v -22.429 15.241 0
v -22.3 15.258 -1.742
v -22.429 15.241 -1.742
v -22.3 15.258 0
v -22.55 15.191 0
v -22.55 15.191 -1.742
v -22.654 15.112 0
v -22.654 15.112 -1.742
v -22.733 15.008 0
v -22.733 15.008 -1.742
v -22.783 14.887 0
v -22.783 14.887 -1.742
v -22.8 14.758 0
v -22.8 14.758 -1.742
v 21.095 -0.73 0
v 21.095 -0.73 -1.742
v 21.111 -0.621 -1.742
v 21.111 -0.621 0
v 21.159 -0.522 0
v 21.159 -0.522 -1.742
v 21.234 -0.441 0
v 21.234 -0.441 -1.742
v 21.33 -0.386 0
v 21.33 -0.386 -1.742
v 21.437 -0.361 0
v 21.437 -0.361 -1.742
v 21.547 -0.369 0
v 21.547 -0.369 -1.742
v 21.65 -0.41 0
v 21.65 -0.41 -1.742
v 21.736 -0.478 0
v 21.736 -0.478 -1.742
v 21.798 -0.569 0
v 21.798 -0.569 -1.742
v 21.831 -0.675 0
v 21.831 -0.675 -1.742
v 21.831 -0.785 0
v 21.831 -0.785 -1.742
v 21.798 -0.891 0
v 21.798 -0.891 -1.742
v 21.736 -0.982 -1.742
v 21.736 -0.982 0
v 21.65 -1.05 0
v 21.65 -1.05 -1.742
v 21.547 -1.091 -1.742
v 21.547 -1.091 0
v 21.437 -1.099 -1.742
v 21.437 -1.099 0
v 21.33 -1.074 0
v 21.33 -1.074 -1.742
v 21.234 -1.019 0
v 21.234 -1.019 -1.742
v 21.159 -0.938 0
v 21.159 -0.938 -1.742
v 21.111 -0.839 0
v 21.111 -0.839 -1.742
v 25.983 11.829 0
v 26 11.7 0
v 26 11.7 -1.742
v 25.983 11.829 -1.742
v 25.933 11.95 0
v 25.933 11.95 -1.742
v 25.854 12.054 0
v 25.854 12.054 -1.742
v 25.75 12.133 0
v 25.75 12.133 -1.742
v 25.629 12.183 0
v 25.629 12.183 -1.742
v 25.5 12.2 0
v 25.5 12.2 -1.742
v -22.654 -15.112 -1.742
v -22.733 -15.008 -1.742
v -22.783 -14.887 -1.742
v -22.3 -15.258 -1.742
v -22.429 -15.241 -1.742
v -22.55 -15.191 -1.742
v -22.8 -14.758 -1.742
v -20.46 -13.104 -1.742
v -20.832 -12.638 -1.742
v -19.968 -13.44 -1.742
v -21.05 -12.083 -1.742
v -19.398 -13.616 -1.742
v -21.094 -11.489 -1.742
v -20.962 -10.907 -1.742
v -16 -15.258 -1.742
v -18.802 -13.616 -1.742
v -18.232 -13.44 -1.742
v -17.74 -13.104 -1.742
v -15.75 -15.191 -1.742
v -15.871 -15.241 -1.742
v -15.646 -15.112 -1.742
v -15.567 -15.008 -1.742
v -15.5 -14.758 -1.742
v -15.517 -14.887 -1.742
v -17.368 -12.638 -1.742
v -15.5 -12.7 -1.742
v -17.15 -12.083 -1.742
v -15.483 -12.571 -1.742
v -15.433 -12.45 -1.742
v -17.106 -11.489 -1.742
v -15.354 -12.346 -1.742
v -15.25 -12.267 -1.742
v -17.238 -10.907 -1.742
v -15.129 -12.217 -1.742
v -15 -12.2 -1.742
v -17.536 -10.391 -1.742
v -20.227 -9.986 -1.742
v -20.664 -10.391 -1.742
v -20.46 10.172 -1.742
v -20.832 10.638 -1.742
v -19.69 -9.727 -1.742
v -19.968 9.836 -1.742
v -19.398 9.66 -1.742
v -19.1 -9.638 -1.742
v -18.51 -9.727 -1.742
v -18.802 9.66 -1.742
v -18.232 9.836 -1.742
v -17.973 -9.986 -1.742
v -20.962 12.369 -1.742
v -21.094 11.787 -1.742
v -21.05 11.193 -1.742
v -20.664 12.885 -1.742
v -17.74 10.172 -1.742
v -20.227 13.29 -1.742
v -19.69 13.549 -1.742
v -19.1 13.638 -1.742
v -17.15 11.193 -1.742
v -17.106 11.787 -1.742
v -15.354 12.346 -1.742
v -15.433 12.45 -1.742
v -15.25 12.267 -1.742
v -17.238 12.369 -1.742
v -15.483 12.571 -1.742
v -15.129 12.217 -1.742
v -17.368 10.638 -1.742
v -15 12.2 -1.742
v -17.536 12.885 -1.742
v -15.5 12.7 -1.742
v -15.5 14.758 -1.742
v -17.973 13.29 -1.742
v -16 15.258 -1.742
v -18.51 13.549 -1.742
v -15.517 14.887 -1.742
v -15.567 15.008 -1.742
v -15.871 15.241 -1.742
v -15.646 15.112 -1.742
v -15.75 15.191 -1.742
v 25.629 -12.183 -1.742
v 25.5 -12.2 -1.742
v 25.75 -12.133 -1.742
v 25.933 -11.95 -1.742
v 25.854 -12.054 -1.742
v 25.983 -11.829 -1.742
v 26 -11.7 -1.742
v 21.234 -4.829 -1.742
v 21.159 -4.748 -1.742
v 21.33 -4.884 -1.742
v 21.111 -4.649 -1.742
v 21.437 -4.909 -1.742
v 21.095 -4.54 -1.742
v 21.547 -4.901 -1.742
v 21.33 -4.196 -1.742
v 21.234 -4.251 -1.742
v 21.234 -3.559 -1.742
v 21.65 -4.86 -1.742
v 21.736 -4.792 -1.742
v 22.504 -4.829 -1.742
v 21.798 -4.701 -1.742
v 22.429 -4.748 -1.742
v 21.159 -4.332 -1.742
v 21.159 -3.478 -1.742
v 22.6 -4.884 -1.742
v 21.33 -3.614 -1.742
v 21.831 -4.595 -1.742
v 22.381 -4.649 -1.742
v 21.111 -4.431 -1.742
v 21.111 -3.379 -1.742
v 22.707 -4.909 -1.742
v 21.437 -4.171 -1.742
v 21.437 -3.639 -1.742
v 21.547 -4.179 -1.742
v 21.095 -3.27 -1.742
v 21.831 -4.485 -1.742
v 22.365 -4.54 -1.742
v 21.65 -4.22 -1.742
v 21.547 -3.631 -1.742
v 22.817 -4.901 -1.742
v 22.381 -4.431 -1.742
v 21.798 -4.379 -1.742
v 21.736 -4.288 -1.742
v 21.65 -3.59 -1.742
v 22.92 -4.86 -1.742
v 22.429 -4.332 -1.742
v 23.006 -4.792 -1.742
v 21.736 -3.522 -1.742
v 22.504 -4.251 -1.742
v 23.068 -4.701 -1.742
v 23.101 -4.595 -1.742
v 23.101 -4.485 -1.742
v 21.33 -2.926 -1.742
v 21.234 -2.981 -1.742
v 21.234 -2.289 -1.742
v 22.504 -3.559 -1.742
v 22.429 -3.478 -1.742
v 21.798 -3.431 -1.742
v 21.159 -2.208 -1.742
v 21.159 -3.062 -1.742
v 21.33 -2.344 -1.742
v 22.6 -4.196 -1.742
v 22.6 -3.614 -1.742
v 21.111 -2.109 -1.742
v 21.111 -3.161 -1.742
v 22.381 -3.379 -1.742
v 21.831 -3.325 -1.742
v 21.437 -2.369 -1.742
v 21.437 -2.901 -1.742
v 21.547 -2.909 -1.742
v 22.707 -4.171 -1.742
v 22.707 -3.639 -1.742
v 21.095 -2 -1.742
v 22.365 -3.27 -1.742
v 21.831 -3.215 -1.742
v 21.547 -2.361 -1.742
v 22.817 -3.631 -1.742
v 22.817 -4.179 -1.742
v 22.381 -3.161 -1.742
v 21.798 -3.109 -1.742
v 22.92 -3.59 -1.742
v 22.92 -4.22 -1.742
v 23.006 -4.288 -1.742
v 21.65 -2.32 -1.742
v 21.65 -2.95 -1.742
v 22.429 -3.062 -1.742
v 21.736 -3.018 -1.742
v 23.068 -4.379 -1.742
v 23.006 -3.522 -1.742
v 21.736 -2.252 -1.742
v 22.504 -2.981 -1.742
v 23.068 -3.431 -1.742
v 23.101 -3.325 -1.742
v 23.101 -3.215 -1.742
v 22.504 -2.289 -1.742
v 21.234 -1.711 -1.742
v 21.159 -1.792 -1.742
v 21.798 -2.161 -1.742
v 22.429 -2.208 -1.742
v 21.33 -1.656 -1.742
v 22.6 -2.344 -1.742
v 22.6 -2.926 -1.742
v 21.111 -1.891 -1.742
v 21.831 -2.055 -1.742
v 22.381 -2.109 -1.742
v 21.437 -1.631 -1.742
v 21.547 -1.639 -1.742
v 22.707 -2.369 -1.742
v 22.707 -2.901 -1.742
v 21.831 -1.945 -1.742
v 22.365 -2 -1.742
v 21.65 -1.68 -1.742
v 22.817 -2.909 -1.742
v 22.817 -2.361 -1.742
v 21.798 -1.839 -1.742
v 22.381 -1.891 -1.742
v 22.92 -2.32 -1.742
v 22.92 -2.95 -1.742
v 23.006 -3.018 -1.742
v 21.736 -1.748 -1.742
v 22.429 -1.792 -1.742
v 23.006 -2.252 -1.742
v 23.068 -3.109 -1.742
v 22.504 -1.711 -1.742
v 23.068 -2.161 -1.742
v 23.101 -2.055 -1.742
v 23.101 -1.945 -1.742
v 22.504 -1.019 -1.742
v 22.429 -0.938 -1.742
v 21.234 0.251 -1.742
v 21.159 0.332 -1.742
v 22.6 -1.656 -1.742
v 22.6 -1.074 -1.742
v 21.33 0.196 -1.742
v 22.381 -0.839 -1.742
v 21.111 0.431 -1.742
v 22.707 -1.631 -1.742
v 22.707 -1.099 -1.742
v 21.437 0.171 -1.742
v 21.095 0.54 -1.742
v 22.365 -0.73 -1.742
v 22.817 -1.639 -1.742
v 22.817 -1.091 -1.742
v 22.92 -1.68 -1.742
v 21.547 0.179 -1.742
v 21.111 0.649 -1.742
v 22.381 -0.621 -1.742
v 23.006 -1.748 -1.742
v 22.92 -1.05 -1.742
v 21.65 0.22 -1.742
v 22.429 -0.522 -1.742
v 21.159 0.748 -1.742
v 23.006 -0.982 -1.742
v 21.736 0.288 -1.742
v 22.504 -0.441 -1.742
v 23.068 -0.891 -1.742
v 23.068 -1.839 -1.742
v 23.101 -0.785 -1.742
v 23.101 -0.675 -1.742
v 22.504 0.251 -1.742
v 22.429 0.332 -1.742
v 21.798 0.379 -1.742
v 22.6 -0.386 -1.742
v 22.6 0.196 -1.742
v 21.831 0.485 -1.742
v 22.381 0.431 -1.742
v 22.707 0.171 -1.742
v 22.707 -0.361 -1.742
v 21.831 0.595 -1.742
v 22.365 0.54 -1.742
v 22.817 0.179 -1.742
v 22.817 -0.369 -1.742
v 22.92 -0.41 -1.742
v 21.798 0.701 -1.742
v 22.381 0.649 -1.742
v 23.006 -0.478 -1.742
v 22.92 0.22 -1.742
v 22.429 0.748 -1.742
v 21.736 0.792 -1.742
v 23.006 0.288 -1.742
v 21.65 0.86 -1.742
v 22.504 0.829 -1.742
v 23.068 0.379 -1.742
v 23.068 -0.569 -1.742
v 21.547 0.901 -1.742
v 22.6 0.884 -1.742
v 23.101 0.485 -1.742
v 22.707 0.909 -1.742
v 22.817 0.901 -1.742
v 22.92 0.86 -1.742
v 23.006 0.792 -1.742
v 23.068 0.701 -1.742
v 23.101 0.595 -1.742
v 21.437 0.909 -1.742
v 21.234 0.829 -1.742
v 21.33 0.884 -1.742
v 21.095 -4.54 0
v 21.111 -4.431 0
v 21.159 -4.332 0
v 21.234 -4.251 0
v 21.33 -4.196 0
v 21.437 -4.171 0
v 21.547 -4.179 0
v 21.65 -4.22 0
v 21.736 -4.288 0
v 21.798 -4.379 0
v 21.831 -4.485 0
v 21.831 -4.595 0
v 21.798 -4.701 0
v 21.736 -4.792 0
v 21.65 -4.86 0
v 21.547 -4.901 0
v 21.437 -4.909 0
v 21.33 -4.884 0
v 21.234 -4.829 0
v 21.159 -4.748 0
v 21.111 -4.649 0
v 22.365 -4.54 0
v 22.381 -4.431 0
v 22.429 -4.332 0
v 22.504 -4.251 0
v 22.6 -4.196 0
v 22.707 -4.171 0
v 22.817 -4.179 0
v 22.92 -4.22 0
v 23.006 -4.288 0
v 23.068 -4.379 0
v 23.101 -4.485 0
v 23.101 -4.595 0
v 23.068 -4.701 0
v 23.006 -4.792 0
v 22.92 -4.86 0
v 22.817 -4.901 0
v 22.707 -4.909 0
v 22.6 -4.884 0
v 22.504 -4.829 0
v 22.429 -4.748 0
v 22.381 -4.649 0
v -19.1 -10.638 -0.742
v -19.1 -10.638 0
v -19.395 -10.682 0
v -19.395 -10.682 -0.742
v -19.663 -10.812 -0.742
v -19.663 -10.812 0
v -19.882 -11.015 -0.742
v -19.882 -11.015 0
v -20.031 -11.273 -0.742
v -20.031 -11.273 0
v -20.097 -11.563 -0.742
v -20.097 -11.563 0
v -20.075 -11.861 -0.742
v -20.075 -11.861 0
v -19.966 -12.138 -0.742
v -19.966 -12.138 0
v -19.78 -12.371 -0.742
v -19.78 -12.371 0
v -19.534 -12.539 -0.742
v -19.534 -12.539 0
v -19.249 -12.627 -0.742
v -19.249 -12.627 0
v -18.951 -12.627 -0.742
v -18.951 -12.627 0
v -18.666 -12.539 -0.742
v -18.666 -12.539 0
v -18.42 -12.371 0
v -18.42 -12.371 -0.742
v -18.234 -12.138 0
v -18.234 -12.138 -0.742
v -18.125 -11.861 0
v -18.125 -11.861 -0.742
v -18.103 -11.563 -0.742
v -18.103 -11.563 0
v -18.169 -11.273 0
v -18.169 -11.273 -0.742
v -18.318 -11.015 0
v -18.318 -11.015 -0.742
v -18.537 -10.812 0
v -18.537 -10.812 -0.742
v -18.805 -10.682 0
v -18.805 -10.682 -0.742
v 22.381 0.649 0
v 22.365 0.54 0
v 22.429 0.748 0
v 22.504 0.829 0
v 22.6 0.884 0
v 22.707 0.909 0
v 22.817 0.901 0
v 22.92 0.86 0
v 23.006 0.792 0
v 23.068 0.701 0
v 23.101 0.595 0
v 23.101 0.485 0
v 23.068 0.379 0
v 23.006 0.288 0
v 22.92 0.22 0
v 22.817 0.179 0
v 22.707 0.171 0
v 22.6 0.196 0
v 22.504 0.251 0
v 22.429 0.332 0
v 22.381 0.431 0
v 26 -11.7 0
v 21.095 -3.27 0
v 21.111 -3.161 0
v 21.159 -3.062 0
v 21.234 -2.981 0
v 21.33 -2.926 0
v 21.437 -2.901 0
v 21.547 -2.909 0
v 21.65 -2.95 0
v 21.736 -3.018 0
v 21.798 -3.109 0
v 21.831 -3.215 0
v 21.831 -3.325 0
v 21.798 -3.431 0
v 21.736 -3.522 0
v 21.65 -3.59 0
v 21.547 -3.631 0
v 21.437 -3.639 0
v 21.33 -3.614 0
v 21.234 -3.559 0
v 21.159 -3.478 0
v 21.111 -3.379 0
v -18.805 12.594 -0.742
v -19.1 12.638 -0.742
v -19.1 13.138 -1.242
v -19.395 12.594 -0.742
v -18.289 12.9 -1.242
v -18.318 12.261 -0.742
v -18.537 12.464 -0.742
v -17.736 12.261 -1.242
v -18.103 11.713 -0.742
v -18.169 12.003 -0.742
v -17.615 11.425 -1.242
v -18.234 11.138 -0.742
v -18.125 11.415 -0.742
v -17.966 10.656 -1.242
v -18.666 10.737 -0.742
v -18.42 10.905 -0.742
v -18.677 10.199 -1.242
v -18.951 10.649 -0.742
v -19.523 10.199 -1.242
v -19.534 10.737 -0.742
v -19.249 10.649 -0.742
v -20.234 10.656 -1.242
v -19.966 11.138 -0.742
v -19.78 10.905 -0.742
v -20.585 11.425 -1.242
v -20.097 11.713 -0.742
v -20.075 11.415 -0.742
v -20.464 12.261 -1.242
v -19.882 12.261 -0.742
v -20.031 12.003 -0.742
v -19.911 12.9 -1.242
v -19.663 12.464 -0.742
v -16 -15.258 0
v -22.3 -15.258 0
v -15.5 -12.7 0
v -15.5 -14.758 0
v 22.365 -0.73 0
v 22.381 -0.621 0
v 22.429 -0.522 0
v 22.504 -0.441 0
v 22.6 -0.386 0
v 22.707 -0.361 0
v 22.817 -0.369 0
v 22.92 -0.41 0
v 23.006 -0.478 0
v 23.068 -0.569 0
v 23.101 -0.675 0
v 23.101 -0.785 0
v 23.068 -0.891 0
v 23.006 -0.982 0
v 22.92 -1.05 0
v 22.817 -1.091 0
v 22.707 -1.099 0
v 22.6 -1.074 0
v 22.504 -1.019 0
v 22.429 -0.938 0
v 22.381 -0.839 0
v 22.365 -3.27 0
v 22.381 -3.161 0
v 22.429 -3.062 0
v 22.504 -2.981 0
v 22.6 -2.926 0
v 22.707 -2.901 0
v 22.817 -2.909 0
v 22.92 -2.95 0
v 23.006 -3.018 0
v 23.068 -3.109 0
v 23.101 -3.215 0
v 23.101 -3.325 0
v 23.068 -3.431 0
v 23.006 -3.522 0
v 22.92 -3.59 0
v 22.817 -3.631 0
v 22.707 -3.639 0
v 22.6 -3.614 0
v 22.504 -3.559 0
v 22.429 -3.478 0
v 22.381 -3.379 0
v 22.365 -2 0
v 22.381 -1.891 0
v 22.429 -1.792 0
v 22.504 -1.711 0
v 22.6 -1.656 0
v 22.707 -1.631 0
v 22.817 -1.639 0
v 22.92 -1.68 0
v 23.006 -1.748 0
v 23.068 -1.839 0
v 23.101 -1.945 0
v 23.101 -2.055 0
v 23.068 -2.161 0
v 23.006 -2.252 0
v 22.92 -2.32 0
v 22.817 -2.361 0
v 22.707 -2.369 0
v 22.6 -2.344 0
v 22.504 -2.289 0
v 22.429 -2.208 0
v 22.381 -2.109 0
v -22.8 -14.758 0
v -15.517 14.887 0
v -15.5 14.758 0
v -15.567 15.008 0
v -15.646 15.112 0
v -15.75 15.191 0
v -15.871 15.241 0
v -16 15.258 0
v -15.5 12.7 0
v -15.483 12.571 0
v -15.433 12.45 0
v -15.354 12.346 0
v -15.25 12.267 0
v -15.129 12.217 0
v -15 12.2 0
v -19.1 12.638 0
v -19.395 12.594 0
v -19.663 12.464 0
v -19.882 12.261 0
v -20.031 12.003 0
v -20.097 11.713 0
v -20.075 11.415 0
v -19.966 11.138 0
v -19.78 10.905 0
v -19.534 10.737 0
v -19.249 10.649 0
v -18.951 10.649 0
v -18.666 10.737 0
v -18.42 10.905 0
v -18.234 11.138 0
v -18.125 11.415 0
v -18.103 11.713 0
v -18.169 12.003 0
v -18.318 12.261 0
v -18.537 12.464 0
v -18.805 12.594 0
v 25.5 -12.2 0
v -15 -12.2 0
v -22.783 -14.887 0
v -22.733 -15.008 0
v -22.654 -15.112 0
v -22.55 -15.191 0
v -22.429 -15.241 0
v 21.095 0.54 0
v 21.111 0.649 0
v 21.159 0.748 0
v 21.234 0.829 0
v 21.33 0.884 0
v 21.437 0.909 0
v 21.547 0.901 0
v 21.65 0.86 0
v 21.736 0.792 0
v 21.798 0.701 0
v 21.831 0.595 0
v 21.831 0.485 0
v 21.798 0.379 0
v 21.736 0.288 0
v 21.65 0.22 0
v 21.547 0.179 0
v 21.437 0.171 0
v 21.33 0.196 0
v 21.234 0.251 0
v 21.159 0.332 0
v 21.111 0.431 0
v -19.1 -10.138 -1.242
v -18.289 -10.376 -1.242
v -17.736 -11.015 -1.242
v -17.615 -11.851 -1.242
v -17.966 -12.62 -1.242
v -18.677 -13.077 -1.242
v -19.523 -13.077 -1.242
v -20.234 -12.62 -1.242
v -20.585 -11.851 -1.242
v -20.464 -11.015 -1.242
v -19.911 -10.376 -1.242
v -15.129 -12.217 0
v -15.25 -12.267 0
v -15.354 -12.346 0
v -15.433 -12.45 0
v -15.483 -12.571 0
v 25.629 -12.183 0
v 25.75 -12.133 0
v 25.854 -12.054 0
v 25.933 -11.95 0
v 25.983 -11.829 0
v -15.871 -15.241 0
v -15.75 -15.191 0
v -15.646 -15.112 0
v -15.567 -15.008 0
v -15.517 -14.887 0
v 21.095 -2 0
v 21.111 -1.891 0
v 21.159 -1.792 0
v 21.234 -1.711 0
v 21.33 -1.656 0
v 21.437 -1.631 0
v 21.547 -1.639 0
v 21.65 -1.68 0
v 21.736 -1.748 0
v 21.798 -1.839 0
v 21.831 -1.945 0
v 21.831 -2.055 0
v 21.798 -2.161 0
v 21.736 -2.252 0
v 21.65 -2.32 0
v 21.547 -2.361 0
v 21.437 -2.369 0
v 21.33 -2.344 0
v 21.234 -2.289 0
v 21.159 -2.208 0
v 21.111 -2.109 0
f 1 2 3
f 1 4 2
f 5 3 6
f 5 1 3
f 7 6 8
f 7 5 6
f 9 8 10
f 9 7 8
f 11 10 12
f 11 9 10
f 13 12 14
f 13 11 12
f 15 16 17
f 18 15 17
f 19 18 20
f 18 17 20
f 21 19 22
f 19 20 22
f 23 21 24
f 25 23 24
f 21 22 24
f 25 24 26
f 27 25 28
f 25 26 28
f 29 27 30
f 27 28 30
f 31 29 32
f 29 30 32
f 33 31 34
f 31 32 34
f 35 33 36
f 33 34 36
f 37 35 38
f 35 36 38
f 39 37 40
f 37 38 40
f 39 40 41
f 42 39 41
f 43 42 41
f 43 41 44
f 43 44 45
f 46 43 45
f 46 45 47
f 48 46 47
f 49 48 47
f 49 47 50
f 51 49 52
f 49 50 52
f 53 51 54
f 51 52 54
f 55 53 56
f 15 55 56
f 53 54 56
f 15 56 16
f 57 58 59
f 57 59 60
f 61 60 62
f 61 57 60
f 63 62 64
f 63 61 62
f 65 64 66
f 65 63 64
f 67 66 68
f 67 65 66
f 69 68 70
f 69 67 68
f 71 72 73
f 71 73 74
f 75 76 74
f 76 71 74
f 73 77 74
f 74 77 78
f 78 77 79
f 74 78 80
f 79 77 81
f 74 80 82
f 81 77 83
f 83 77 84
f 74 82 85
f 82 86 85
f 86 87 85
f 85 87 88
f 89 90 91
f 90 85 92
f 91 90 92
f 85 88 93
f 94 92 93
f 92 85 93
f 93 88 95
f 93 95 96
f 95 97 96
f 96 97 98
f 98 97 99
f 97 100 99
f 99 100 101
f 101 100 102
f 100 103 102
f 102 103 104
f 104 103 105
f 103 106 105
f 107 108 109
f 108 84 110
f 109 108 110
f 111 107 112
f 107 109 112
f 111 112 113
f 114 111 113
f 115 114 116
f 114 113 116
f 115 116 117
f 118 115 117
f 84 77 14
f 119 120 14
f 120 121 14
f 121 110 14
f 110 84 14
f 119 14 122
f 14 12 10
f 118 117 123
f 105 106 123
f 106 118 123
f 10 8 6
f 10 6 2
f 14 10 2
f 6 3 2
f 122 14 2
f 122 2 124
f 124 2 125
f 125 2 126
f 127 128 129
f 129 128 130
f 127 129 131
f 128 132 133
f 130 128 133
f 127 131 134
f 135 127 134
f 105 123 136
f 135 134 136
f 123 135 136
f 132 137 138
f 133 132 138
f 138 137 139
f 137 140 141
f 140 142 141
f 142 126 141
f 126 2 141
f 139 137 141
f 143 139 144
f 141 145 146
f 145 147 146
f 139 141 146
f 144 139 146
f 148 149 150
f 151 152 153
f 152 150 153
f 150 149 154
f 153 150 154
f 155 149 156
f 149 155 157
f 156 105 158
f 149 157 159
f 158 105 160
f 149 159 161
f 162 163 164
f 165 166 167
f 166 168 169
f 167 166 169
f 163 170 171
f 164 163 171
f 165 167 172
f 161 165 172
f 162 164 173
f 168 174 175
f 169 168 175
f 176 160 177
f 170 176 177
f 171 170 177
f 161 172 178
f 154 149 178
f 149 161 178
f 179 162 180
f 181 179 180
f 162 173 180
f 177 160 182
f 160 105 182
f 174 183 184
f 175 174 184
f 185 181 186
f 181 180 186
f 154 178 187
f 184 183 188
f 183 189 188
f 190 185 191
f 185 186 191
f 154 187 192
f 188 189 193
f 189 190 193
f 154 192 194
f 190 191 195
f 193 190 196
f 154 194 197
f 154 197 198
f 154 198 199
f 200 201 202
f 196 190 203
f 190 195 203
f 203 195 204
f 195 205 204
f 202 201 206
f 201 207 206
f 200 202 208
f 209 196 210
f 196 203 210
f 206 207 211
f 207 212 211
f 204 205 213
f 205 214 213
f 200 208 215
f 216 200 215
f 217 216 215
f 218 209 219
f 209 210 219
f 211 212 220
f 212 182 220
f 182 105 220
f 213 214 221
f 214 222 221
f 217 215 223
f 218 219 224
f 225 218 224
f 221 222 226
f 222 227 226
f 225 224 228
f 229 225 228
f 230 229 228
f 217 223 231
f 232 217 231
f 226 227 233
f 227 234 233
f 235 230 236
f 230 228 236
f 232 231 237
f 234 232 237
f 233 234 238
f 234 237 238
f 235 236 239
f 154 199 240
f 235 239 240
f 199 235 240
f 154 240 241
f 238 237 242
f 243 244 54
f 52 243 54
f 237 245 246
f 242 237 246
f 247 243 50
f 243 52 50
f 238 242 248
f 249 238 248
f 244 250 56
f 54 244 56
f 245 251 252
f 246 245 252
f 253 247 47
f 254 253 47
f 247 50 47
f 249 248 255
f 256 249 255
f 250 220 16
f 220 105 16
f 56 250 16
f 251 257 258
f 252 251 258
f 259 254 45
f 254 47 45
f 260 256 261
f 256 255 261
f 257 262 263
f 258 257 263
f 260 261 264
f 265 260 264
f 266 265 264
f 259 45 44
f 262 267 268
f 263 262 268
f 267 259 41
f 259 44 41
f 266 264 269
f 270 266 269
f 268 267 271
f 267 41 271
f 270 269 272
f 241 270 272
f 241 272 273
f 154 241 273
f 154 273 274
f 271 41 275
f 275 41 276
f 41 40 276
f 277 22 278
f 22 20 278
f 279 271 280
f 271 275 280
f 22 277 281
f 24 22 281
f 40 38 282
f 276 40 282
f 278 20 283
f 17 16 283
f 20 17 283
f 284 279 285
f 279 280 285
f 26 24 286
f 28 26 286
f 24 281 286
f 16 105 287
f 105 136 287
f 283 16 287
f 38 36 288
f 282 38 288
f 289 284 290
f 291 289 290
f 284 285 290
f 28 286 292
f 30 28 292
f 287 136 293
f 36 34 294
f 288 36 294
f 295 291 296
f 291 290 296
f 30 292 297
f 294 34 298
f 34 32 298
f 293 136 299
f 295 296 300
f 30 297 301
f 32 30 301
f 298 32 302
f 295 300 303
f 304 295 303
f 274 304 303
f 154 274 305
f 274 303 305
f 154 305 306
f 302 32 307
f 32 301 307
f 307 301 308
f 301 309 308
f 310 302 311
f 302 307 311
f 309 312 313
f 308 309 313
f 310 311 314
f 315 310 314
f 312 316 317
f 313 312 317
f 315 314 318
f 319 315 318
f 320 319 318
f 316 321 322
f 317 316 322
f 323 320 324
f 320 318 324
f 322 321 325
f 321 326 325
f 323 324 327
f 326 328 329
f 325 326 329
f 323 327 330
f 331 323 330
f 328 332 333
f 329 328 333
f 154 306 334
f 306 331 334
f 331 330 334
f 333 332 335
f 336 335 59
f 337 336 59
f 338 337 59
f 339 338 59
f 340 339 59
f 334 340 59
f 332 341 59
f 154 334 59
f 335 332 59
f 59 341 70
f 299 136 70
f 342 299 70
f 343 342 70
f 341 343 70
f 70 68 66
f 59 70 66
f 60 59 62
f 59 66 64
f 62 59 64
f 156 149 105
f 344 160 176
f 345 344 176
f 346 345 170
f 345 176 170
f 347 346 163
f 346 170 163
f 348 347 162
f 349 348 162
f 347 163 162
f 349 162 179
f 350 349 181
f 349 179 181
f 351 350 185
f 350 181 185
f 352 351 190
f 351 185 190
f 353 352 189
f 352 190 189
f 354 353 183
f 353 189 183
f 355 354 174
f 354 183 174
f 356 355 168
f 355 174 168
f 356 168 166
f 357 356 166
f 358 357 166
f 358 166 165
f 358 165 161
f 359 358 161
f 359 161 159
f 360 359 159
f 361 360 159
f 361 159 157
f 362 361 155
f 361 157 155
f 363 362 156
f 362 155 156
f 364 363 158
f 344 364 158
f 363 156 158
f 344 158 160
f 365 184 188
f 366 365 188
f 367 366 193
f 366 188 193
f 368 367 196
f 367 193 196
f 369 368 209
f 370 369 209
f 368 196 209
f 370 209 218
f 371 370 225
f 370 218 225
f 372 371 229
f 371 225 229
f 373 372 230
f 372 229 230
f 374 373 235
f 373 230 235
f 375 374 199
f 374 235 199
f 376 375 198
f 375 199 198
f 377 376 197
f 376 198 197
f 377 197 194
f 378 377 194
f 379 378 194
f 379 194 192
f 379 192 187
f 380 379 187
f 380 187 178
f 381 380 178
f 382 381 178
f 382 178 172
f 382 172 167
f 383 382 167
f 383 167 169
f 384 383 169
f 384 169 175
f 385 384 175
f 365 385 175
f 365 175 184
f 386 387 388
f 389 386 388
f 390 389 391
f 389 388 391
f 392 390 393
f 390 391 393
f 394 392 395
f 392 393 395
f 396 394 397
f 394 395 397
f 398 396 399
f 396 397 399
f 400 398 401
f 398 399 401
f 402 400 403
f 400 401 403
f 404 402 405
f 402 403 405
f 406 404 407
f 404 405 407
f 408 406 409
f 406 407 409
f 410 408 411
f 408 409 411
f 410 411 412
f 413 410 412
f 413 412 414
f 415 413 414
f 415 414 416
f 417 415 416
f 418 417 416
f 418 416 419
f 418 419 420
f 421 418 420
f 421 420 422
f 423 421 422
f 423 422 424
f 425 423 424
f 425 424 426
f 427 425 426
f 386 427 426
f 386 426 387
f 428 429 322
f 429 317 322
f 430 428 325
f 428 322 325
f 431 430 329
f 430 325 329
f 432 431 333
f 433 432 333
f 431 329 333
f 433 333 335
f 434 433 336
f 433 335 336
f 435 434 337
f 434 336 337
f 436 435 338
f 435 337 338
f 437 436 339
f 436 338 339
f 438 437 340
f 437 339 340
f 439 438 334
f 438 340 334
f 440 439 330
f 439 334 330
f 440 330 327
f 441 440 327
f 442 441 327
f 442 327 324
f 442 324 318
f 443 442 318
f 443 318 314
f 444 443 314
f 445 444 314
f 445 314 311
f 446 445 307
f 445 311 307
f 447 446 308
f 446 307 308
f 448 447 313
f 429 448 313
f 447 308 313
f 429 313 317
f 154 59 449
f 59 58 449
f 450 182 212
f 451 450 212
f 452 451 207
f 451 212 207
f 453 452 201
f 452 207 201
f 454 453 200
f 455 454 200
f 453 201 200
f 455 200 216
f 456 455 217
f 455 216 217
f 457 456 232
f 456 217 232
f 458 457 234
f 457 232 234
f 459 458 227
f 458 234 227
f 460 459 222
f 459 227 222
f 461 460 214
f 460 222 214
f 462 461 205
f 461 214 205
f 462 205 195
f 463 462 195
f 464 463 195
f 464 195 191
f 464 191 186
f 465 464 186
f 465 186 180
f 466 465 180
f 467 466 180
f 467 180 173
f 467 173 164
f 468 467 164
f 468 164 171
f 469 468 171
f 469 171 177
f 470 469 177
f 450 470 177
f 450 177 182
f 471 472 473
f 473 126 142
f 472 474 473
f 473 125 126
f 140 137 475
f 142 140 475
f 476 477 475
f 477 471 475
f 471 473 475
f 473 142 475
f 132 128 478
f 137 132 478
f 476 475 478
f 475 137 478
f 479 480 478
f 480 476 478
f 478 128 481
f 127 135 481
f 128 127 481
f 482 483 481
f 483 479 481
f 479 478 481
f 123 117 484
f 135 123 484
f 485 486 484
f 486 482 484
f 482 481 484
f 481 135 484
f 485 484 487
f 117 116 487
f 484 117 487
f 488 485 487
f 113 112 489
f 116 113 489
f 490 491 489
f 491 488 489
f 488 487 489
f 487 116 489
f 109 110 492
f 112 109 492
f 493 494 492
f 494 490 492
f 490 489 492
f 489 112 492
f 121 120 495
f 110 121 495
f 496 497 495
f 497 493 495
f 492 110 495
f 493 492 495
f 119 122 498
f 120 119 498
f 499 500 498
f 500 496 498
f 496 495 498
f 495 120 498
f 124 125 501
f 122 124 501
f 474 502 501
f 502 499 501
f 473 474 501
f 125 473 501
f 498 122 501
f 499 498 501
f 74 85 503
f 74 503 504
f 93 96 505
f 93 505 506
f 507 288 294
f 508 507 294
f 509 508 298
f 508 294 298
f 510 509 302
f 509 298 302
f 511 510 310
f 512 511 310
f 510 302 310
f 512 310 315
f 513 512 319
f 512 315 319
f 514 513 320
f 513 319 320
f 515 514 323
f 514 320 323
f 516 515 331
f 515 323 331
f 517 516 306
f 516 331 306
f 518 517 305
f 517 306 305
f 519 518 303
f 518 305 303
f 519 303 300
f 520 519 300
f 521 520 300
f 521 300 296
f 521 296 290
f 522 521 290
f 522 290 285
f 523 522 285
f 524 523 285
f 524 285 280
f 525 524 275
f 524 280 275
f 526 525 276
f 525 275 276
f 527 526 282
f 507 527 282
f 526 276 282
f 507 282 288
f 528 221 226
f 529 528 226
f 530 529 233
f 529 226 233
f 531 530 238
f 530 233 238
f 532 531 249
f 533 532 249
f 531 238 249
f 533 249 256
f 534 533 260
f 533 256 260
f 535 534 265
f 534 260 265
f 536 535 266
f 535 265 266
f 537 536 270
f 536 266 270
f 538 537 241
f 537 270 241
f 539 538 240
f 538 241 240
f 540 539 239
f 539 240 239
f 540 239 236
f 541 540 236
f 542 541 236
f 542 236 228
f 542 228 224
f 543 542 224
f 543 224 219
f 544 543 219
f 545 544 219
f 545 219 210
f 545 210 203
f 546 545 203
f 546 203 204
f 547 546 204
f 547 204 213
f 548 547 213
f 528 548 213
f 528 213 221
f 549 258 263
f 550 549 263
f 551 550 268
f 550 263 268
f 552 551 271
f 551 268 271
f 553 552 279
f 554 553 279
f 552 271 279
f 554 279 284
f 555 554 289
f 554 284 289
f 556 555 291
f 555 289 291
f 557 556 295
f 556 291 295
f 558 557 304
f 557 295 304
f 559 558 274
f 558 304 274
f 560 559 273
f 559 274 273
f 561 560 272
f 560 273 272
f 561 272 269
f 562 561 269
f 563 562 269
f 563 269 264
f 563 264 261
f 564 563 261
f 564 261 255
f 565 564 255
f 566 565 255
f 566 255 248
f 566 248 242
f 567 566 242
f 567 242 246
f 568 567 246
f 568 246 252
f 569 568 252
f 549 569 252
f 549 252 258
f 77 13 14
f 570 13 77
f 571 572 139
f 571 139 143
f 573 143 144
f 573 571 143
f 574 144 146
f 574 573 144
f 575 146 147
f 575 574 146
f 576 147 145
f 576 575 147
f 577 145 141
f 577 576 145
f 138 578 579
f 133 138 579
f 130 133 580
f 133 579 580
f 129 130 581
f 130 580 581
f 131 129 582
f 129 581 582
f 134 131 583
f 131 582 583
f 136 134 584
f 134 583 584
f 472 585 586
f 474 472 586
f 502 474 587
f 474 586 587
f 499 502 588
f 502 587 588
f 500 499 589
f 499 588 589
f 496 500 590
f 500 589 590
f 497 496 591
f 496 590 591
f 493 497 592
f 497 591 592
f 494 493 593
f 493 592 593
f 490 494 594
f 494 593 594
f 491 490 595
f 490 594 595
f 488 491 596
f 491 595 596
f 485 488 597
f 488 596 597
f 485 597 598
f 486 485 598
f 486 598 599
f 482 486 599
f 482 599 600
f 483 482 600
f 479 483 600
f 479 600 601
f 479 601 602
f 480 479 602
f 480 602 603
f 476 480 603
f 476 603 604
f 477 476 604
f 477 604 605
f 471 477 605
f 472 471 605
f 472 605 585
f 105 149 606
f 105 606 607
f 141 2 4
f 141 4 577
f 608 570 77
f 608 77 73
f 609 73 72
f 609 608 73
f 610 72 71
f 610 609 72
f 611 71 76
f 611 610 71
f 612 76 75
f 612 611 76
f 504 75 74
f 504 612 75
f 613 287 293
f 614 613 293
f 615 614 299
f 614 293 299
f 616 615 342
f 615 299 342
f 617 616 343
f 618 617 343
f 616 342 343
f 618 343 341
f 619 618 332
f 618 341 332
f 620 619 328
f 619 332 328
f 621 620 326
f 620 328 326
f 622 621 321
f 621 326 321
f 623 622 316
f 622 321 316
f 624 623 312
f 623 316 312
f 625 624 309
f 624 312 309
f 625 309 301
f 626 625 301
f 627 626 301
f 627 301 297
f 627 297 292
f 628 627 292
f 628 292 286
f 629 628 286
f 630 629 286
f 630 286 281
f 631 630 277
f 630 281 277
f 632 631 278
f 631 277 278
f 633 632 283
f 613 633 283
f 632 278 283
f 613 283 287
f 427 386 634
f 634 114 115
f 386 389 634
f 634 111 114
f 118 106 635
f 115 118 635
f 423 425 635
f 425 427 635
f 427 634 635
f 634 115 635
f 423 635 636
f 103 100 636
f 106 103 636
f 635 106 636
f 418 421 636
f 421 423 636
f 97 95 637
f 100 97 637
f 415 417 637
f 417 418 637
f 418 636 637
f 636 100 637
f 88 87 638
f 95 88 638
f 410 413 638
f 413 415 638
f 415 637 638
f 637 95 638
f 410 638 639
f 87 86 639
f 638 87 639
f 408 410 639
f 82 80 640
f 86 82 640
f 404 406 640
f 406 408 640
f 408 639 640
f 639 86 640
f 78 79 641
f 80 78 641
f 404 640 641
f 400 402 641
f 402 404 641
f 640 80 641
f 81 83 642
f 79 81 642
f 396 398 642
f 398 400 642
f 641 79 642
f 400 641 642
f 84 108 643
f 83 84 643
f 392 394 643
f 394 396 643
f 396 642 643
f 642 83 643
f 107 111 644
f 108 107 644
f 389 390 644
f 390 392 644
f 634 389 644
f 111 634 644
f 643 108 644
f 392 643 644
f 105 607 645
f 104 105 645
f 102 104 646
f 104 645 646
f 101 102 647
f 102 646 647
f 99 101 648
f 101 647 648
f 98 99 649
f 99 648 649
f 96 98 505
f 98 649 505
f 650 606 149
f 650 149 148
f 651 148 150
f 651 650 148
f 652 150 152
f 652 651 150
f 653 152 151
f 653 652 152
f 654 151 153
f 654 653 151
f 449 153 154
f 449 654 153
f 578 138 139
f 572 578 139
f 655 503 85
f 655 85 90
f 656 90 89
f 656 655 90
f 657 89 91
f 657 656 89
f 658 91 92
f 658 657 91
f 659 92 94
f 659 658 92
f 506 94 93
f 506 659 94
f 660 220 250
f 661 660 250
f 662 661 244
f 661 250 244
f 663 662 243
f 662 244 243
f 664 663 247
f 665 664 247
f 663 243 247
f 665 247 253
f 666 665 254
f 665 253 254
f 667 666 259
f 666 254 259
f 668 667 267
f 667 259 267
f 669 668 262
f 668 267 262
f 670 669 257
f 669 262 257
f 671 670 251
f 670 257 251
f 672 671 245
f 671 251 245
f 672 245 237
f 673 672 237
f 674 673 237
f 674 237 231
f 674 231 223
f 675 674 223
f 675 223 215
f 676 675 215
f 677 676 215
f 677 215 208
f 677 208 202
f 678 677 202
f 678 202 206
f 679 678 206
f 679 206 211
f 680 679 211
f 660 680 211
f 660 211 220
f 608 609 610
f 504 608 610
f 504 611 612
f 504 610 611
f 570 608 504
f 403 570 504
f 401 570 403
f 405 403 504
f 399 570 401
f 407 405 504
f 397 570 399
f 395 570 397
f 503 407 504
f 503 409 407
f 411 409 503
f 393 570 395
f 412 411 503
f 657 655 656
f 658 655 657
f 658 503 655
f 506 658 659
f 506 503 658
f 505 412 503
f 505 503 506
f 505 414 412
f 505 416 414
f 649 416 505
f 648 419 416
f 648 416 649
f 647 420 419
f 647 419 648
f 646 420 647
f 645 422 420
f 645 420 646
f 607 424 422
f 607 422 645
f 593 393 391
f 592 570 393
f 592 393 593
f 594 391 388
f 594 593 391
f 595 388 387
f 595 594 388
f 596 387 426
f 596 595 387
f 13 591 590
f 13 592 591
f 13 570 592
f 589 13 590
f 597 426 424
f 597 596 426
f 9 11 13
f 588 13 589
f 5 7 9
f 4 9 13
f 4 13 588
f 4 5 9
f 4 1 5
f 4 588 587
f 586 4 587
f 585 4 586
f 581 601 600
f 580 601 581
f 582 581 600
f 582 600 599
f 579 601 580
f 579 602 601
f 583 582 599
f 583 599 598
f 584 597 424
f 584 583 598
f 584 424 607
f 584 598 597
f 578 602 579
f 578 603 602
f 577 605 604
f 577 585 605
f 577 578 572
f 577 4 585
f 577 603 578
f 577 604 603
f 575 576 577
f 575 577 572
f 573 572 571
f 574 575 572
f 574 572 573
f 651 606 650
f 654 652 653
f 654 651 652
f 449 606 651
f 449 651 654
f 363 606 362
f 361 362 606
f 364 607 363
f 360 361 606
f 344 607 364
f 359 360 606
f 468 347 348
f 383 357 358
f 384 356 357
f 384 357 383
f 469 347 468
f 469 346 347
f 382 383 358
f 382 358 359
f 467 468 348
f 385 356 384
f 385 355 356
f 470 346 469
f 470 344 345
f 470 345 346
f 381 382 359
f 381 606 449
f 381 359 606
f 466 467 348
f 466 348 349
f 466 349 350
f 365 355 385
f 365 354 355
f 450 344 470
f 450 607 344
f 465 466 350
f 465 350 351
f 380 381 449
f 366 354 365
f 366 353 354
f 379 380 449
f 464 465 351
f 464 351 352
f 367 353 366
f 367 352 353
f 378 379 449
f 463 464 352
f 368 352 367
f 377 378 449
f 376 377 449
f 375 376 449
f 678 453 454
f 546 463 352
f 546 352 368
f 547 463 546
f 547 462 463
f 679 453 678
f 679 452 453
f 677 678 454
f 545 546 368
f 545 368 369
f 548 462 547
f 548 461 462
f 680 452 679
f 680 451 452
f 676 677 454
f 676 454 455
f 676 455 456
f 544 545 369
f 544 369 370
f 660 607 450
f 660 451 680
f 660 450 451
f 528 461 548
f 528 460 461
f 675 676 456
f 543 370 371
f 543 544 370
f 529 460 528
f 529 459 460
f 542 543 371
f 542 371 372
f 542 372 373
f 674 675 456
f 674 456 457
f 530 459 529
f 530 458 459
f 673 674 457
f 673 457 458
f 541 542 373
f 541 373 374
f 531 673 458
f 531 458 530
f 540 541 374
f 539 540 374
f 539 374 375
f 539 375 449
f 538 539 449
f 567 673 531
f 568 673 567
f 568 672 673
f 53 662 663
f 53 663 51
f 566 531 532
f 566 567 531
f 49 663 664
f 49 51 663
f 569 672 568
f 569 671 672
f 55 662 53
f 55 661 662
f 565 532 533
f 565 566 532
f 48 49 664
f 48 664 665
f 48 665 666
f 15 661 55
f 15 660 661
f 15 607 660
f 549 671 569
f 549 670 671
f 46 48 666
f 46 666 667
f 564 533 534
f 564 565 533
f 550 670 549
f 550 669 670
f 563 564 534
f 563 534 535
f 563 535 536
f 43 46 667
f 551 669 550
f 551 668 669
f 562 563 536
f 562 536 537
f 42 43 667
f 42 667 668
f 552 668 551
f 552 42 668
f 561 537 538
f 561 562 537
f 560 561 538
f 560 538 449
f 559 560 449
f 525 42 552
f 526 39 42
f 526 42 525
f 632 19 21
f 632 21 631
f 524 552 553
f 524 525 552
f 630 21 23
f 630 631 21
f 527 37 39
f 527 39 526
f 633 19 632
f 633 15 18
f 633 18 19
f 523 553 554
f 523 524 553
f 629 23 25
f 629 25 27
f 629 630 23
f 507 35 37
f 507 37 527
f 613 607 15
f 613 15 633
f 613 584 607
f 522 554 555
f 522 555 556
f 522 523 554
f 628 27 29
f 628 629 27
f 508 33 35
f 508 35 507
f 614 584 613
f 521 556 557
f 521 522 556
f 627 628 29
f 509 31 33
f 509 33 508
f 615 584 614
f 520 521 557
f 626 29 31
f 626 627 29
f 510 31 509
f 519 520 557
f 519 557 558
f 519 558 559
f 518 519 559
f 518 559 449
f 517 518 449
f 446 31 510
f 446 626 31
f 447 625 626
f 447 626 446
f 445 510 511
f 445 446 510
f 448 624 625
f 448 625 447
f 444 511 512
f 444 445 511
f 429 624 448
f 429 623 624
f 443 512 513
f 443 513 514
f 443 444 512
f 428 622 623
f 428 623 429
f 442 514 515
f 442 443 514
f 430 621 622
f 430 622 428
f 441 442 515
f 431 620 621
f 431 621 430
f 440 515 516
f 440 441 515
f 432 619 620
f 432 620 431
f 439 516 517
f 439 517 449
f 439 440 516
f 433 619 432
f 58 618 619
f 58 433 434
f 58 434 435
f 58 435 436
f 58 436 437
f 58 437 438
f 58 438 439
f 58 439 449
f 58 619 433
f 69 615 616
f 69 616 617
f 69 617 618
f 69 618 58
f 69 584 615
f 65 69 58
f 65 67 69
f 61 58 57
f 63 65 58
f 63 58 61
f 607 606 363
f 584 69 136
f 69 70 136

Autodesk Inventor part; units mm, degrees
ref_plane "YZ Plane" through (0, 0, 0) normal (1, 0, 0) x (0, 1, 0)
ref_plane "XZ Plane" through (0, 0, 0) normal (0, 1, 0) x (-1, 0, 0)
ref_plane "XY Plane" through (0, 0, 0) normal (0, 0, 1) x (1, 0, 0)
sketch "Boceto1" plane through (0, 0, 0) normal (0, 0, 1) x (1, 0, 0)
  line L0 (-26, 17) -> (26, 17)
  line L1 (26, 17) -> (26, -17)
  line L2 (26, -17) -> (-26, -17)
  line L3 (-26, -17) -> (-26, 17)
  line L4 (-26, 17) -> (26, -17) construction
  line L5 (26, 17) -> (-26, -17) construction
  point P0 (0, 0)
  dimension "d0" = 52
  dimension "d1" = 34
extrude "Extrusión1" add sketch "Boceto1" against normal blind 1.742
fillet "Empalme1" radius 0.5 4 edges at (26, 17, -0.871) (-26, 17, -0.871) (-26, -17, -0.871) (26, -17, -0.871)
sketch "Boceto2" plane through (0, 0, -1.742) normal (0, 0, -1) x (-1, 0, 0)
  line L0 (-25.5, 17) -> (25.5, 17) projected
  line L1 (25.5, -17) -> (-25.5, -17) projected
  line L2 (25.5, 17) -> (-25.5, 17) projected
  line L3 (15.5, 17) -> (-26, 17)
  line L4 (-26, 17) -> (-26, 12.2)
  line L5 (-26, 12.2) -> (15.5, 12.2)
  line L6 (15.5, 12.2) -> (15.5, 17)
  line L7 (-26, -16.5) -> (-26, 16.5) projected
  line L8 (-25.5, -17) -> (25.5, -17) projected
  line L9 (-26, 16.5) -> (-26, -16.5) projected
  line L10 (15.5, -17) -> (-26, -17)
  line L11 (-26, -17) -> (-26, -12.2)
  line L12 (-26, -12.2) -> (15.5, -12.2)
  line L13 (15.5, -12.2) -> (15.5, -17)
  point P0 (0, 0)
  dimension "d5" = 4.8
  dimension "d6" = 41.5
  dimension "d7" = 4.8
  dimension "d8" = 41.5
extrude "Extrusión2" cut sketch "Boceto2" against normal through all
sketch "Boceto4" plane through (0, 0, 0) normal (0, 0, 1) x (1, 0, 0)
  line L0 (-26, -16.5) -> (-26, 16.5) construction
  line L1 (-26, 17) -> (-22.8, 17)
  line L2 (-22.8, 17) -> (-22.8, -17)
  line L3 (-22.8, -17) -> (-26, -17)
  line L4 (-26, -17) -> (-26, 17)
  line L5 (-15.5, -17) -> (-25.5, -17) projected
  line L6 (-25.5, 17) -> (-15.5, 17) projected
  point P0 (0, 0)
  dimension "d17" = 3.2
extrude "Extrusión4" cut sketch "Boceto4" against normal up to surface (1.742 mm away)
sketch "Boceto7" plane through (0, 0, -1.742) normal (0, 0, -1) x (-1, 0, 0)
  line L0 (22.8, -17) -> (22.8, 17) projected
  line L1 (22.8, 17) -> (15.5, 17) projected
  line L2 (15.5, -17) -> (22.8, -17) projected
  point P0 (0, 0)
  point P1 (19.1, 11.638)
  point P2 (19.1, -11.638)
  dimension "d30" = 3.7
  dimension "d31" = 5.362
  dimension "d32" = 5.362
hole "Agujero2" at (-19.1, 11.638, -1.742) at (-19.1, -11.638, -1.742) direction (0, 0, 1) diameter 2 end through all countersink diameter 4 countersink angle 90
fillet "Empalme2" radius 0.5 8 edges at (-15.5, 17, -0.871) (-22.8, 17, -0.871) (-15.5, 12.2, -0.871) (26, 12.2, -0.871) (26, -12.2, -0.871) (-15.5, -12.2, -0.871) (-15.5, -17, -0.871) (-22.8, -17, -0.871)
sketch "Boceto8" plane through (0, 0, -1.742) normal (0, 0, -1) x (-1, 0, 0)
  line L0 (-26, 11.7) -> (-26, -11.7) construction
  line L1 (-25.5, -12.2) -> (15, -12.2) construction
  circle A0 centre (-22.735, 0.54) radius 0.37
  circle A1 centre (-21.465, 0.54) radius 0.37
  circle A2 centre (-22.735, -0.73) radius 0.37
  circle A3 centre (-21.465, -0.73) radius 0.37
  circle A4 centre (-22.735, -2) radius 0.37
  circle A5 centre (-21.465, -2) radius 0.37
  circle A6 centre (-22.735, -3.27) radius 0.37
  circle A7 centre (-21.465, -3.27) radius 0.37
  circle A8 centre (-22.735, -4.54) radius 0.37
  circle A9 centre (-21.465, -4.54) radius 0.37
  point P0 (0, 0)
  dimension "d49" = 3.265
  dimension "d50" = 1.27
  dimension "d51" = 1.27
  dimension "d52" = 1.27
  dimension "d53" = 1.27
  dimension "d54" = 12.74
  dimension "d55" = 0.74
  dimension "d56" = 0.74
  dimension "d57" = 0.74
  dimension "d58" = 0.74
  dimension "d59" = 0.74
  dimension "d60" = 0.74
  dimension "d61" = 0.74
  dimension "d62" = 0.74
  dimension "d63" = 1.27
  dimension "d64" = 0.74
  dimension "d65" = 0.74
extrude "Extrusión5" cut sketch "Boceto8" against normal up to surface (1.742 mm away)
sketch "Boceto9" plane through (0, 0, -1.742) normal (0, 0, -1) x (-1, 0, 0)
  line L0 (22.8, -17) -> (15.5, -17)
  line L1 (15.5, -17) -> (15.5, -15.258)
  line L2 (15.5, -15.258) -> (22.8, -15.258)
  line L3 (22.8, -15.258) -> (22.8, -17)
  line L4 (22.8, 15.258) -> (15.5, 15.258)
  line L5 (15.5, 15.258) -> (15.5, 17)
  line L6 (15.5, 17) -> (22.8, 17)
  line L7 (22.8, 17) -> (22.8, 15.258)
  point P0 (0, 0)
  point P1 (22.3, -17)
  point P2 (22.8, -16.5)
  point P3 (15.5, -16.5)
  point P4 (16, 17)
  point P5 (22.8, 16.5)
  point P6 (15.5, 16.5)
  dimension "d43" = 1.742
  dimension "d44" = 1.742
extrude "Extrusión6" cut sketch "Boceto9" against normal up to surface (1.742 mm away)
fillet "Empalme3" radius 0.5 4 edges at (-22.8, -15.258, -0.871) (-15.5, -15.258, -0.871) (-22.8, 15.258, -0.871) (-15.5, 15.258, -0.871)
properties part number "hw_DAA - PCB Peripherals" material "PCB"
